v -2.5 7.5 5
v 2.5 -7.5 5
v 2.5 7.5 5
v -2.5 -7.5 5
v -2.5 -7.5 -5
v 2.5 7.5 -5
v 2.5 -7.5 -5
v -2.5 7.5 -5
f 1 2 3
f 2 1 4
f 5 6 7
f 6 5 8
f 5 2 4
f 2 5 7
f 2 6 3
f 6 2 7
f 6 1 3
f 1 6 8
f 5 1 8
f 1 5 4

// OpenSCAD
// Generated by generate_scads.py
cube(size=[5,15,10], center=true);
